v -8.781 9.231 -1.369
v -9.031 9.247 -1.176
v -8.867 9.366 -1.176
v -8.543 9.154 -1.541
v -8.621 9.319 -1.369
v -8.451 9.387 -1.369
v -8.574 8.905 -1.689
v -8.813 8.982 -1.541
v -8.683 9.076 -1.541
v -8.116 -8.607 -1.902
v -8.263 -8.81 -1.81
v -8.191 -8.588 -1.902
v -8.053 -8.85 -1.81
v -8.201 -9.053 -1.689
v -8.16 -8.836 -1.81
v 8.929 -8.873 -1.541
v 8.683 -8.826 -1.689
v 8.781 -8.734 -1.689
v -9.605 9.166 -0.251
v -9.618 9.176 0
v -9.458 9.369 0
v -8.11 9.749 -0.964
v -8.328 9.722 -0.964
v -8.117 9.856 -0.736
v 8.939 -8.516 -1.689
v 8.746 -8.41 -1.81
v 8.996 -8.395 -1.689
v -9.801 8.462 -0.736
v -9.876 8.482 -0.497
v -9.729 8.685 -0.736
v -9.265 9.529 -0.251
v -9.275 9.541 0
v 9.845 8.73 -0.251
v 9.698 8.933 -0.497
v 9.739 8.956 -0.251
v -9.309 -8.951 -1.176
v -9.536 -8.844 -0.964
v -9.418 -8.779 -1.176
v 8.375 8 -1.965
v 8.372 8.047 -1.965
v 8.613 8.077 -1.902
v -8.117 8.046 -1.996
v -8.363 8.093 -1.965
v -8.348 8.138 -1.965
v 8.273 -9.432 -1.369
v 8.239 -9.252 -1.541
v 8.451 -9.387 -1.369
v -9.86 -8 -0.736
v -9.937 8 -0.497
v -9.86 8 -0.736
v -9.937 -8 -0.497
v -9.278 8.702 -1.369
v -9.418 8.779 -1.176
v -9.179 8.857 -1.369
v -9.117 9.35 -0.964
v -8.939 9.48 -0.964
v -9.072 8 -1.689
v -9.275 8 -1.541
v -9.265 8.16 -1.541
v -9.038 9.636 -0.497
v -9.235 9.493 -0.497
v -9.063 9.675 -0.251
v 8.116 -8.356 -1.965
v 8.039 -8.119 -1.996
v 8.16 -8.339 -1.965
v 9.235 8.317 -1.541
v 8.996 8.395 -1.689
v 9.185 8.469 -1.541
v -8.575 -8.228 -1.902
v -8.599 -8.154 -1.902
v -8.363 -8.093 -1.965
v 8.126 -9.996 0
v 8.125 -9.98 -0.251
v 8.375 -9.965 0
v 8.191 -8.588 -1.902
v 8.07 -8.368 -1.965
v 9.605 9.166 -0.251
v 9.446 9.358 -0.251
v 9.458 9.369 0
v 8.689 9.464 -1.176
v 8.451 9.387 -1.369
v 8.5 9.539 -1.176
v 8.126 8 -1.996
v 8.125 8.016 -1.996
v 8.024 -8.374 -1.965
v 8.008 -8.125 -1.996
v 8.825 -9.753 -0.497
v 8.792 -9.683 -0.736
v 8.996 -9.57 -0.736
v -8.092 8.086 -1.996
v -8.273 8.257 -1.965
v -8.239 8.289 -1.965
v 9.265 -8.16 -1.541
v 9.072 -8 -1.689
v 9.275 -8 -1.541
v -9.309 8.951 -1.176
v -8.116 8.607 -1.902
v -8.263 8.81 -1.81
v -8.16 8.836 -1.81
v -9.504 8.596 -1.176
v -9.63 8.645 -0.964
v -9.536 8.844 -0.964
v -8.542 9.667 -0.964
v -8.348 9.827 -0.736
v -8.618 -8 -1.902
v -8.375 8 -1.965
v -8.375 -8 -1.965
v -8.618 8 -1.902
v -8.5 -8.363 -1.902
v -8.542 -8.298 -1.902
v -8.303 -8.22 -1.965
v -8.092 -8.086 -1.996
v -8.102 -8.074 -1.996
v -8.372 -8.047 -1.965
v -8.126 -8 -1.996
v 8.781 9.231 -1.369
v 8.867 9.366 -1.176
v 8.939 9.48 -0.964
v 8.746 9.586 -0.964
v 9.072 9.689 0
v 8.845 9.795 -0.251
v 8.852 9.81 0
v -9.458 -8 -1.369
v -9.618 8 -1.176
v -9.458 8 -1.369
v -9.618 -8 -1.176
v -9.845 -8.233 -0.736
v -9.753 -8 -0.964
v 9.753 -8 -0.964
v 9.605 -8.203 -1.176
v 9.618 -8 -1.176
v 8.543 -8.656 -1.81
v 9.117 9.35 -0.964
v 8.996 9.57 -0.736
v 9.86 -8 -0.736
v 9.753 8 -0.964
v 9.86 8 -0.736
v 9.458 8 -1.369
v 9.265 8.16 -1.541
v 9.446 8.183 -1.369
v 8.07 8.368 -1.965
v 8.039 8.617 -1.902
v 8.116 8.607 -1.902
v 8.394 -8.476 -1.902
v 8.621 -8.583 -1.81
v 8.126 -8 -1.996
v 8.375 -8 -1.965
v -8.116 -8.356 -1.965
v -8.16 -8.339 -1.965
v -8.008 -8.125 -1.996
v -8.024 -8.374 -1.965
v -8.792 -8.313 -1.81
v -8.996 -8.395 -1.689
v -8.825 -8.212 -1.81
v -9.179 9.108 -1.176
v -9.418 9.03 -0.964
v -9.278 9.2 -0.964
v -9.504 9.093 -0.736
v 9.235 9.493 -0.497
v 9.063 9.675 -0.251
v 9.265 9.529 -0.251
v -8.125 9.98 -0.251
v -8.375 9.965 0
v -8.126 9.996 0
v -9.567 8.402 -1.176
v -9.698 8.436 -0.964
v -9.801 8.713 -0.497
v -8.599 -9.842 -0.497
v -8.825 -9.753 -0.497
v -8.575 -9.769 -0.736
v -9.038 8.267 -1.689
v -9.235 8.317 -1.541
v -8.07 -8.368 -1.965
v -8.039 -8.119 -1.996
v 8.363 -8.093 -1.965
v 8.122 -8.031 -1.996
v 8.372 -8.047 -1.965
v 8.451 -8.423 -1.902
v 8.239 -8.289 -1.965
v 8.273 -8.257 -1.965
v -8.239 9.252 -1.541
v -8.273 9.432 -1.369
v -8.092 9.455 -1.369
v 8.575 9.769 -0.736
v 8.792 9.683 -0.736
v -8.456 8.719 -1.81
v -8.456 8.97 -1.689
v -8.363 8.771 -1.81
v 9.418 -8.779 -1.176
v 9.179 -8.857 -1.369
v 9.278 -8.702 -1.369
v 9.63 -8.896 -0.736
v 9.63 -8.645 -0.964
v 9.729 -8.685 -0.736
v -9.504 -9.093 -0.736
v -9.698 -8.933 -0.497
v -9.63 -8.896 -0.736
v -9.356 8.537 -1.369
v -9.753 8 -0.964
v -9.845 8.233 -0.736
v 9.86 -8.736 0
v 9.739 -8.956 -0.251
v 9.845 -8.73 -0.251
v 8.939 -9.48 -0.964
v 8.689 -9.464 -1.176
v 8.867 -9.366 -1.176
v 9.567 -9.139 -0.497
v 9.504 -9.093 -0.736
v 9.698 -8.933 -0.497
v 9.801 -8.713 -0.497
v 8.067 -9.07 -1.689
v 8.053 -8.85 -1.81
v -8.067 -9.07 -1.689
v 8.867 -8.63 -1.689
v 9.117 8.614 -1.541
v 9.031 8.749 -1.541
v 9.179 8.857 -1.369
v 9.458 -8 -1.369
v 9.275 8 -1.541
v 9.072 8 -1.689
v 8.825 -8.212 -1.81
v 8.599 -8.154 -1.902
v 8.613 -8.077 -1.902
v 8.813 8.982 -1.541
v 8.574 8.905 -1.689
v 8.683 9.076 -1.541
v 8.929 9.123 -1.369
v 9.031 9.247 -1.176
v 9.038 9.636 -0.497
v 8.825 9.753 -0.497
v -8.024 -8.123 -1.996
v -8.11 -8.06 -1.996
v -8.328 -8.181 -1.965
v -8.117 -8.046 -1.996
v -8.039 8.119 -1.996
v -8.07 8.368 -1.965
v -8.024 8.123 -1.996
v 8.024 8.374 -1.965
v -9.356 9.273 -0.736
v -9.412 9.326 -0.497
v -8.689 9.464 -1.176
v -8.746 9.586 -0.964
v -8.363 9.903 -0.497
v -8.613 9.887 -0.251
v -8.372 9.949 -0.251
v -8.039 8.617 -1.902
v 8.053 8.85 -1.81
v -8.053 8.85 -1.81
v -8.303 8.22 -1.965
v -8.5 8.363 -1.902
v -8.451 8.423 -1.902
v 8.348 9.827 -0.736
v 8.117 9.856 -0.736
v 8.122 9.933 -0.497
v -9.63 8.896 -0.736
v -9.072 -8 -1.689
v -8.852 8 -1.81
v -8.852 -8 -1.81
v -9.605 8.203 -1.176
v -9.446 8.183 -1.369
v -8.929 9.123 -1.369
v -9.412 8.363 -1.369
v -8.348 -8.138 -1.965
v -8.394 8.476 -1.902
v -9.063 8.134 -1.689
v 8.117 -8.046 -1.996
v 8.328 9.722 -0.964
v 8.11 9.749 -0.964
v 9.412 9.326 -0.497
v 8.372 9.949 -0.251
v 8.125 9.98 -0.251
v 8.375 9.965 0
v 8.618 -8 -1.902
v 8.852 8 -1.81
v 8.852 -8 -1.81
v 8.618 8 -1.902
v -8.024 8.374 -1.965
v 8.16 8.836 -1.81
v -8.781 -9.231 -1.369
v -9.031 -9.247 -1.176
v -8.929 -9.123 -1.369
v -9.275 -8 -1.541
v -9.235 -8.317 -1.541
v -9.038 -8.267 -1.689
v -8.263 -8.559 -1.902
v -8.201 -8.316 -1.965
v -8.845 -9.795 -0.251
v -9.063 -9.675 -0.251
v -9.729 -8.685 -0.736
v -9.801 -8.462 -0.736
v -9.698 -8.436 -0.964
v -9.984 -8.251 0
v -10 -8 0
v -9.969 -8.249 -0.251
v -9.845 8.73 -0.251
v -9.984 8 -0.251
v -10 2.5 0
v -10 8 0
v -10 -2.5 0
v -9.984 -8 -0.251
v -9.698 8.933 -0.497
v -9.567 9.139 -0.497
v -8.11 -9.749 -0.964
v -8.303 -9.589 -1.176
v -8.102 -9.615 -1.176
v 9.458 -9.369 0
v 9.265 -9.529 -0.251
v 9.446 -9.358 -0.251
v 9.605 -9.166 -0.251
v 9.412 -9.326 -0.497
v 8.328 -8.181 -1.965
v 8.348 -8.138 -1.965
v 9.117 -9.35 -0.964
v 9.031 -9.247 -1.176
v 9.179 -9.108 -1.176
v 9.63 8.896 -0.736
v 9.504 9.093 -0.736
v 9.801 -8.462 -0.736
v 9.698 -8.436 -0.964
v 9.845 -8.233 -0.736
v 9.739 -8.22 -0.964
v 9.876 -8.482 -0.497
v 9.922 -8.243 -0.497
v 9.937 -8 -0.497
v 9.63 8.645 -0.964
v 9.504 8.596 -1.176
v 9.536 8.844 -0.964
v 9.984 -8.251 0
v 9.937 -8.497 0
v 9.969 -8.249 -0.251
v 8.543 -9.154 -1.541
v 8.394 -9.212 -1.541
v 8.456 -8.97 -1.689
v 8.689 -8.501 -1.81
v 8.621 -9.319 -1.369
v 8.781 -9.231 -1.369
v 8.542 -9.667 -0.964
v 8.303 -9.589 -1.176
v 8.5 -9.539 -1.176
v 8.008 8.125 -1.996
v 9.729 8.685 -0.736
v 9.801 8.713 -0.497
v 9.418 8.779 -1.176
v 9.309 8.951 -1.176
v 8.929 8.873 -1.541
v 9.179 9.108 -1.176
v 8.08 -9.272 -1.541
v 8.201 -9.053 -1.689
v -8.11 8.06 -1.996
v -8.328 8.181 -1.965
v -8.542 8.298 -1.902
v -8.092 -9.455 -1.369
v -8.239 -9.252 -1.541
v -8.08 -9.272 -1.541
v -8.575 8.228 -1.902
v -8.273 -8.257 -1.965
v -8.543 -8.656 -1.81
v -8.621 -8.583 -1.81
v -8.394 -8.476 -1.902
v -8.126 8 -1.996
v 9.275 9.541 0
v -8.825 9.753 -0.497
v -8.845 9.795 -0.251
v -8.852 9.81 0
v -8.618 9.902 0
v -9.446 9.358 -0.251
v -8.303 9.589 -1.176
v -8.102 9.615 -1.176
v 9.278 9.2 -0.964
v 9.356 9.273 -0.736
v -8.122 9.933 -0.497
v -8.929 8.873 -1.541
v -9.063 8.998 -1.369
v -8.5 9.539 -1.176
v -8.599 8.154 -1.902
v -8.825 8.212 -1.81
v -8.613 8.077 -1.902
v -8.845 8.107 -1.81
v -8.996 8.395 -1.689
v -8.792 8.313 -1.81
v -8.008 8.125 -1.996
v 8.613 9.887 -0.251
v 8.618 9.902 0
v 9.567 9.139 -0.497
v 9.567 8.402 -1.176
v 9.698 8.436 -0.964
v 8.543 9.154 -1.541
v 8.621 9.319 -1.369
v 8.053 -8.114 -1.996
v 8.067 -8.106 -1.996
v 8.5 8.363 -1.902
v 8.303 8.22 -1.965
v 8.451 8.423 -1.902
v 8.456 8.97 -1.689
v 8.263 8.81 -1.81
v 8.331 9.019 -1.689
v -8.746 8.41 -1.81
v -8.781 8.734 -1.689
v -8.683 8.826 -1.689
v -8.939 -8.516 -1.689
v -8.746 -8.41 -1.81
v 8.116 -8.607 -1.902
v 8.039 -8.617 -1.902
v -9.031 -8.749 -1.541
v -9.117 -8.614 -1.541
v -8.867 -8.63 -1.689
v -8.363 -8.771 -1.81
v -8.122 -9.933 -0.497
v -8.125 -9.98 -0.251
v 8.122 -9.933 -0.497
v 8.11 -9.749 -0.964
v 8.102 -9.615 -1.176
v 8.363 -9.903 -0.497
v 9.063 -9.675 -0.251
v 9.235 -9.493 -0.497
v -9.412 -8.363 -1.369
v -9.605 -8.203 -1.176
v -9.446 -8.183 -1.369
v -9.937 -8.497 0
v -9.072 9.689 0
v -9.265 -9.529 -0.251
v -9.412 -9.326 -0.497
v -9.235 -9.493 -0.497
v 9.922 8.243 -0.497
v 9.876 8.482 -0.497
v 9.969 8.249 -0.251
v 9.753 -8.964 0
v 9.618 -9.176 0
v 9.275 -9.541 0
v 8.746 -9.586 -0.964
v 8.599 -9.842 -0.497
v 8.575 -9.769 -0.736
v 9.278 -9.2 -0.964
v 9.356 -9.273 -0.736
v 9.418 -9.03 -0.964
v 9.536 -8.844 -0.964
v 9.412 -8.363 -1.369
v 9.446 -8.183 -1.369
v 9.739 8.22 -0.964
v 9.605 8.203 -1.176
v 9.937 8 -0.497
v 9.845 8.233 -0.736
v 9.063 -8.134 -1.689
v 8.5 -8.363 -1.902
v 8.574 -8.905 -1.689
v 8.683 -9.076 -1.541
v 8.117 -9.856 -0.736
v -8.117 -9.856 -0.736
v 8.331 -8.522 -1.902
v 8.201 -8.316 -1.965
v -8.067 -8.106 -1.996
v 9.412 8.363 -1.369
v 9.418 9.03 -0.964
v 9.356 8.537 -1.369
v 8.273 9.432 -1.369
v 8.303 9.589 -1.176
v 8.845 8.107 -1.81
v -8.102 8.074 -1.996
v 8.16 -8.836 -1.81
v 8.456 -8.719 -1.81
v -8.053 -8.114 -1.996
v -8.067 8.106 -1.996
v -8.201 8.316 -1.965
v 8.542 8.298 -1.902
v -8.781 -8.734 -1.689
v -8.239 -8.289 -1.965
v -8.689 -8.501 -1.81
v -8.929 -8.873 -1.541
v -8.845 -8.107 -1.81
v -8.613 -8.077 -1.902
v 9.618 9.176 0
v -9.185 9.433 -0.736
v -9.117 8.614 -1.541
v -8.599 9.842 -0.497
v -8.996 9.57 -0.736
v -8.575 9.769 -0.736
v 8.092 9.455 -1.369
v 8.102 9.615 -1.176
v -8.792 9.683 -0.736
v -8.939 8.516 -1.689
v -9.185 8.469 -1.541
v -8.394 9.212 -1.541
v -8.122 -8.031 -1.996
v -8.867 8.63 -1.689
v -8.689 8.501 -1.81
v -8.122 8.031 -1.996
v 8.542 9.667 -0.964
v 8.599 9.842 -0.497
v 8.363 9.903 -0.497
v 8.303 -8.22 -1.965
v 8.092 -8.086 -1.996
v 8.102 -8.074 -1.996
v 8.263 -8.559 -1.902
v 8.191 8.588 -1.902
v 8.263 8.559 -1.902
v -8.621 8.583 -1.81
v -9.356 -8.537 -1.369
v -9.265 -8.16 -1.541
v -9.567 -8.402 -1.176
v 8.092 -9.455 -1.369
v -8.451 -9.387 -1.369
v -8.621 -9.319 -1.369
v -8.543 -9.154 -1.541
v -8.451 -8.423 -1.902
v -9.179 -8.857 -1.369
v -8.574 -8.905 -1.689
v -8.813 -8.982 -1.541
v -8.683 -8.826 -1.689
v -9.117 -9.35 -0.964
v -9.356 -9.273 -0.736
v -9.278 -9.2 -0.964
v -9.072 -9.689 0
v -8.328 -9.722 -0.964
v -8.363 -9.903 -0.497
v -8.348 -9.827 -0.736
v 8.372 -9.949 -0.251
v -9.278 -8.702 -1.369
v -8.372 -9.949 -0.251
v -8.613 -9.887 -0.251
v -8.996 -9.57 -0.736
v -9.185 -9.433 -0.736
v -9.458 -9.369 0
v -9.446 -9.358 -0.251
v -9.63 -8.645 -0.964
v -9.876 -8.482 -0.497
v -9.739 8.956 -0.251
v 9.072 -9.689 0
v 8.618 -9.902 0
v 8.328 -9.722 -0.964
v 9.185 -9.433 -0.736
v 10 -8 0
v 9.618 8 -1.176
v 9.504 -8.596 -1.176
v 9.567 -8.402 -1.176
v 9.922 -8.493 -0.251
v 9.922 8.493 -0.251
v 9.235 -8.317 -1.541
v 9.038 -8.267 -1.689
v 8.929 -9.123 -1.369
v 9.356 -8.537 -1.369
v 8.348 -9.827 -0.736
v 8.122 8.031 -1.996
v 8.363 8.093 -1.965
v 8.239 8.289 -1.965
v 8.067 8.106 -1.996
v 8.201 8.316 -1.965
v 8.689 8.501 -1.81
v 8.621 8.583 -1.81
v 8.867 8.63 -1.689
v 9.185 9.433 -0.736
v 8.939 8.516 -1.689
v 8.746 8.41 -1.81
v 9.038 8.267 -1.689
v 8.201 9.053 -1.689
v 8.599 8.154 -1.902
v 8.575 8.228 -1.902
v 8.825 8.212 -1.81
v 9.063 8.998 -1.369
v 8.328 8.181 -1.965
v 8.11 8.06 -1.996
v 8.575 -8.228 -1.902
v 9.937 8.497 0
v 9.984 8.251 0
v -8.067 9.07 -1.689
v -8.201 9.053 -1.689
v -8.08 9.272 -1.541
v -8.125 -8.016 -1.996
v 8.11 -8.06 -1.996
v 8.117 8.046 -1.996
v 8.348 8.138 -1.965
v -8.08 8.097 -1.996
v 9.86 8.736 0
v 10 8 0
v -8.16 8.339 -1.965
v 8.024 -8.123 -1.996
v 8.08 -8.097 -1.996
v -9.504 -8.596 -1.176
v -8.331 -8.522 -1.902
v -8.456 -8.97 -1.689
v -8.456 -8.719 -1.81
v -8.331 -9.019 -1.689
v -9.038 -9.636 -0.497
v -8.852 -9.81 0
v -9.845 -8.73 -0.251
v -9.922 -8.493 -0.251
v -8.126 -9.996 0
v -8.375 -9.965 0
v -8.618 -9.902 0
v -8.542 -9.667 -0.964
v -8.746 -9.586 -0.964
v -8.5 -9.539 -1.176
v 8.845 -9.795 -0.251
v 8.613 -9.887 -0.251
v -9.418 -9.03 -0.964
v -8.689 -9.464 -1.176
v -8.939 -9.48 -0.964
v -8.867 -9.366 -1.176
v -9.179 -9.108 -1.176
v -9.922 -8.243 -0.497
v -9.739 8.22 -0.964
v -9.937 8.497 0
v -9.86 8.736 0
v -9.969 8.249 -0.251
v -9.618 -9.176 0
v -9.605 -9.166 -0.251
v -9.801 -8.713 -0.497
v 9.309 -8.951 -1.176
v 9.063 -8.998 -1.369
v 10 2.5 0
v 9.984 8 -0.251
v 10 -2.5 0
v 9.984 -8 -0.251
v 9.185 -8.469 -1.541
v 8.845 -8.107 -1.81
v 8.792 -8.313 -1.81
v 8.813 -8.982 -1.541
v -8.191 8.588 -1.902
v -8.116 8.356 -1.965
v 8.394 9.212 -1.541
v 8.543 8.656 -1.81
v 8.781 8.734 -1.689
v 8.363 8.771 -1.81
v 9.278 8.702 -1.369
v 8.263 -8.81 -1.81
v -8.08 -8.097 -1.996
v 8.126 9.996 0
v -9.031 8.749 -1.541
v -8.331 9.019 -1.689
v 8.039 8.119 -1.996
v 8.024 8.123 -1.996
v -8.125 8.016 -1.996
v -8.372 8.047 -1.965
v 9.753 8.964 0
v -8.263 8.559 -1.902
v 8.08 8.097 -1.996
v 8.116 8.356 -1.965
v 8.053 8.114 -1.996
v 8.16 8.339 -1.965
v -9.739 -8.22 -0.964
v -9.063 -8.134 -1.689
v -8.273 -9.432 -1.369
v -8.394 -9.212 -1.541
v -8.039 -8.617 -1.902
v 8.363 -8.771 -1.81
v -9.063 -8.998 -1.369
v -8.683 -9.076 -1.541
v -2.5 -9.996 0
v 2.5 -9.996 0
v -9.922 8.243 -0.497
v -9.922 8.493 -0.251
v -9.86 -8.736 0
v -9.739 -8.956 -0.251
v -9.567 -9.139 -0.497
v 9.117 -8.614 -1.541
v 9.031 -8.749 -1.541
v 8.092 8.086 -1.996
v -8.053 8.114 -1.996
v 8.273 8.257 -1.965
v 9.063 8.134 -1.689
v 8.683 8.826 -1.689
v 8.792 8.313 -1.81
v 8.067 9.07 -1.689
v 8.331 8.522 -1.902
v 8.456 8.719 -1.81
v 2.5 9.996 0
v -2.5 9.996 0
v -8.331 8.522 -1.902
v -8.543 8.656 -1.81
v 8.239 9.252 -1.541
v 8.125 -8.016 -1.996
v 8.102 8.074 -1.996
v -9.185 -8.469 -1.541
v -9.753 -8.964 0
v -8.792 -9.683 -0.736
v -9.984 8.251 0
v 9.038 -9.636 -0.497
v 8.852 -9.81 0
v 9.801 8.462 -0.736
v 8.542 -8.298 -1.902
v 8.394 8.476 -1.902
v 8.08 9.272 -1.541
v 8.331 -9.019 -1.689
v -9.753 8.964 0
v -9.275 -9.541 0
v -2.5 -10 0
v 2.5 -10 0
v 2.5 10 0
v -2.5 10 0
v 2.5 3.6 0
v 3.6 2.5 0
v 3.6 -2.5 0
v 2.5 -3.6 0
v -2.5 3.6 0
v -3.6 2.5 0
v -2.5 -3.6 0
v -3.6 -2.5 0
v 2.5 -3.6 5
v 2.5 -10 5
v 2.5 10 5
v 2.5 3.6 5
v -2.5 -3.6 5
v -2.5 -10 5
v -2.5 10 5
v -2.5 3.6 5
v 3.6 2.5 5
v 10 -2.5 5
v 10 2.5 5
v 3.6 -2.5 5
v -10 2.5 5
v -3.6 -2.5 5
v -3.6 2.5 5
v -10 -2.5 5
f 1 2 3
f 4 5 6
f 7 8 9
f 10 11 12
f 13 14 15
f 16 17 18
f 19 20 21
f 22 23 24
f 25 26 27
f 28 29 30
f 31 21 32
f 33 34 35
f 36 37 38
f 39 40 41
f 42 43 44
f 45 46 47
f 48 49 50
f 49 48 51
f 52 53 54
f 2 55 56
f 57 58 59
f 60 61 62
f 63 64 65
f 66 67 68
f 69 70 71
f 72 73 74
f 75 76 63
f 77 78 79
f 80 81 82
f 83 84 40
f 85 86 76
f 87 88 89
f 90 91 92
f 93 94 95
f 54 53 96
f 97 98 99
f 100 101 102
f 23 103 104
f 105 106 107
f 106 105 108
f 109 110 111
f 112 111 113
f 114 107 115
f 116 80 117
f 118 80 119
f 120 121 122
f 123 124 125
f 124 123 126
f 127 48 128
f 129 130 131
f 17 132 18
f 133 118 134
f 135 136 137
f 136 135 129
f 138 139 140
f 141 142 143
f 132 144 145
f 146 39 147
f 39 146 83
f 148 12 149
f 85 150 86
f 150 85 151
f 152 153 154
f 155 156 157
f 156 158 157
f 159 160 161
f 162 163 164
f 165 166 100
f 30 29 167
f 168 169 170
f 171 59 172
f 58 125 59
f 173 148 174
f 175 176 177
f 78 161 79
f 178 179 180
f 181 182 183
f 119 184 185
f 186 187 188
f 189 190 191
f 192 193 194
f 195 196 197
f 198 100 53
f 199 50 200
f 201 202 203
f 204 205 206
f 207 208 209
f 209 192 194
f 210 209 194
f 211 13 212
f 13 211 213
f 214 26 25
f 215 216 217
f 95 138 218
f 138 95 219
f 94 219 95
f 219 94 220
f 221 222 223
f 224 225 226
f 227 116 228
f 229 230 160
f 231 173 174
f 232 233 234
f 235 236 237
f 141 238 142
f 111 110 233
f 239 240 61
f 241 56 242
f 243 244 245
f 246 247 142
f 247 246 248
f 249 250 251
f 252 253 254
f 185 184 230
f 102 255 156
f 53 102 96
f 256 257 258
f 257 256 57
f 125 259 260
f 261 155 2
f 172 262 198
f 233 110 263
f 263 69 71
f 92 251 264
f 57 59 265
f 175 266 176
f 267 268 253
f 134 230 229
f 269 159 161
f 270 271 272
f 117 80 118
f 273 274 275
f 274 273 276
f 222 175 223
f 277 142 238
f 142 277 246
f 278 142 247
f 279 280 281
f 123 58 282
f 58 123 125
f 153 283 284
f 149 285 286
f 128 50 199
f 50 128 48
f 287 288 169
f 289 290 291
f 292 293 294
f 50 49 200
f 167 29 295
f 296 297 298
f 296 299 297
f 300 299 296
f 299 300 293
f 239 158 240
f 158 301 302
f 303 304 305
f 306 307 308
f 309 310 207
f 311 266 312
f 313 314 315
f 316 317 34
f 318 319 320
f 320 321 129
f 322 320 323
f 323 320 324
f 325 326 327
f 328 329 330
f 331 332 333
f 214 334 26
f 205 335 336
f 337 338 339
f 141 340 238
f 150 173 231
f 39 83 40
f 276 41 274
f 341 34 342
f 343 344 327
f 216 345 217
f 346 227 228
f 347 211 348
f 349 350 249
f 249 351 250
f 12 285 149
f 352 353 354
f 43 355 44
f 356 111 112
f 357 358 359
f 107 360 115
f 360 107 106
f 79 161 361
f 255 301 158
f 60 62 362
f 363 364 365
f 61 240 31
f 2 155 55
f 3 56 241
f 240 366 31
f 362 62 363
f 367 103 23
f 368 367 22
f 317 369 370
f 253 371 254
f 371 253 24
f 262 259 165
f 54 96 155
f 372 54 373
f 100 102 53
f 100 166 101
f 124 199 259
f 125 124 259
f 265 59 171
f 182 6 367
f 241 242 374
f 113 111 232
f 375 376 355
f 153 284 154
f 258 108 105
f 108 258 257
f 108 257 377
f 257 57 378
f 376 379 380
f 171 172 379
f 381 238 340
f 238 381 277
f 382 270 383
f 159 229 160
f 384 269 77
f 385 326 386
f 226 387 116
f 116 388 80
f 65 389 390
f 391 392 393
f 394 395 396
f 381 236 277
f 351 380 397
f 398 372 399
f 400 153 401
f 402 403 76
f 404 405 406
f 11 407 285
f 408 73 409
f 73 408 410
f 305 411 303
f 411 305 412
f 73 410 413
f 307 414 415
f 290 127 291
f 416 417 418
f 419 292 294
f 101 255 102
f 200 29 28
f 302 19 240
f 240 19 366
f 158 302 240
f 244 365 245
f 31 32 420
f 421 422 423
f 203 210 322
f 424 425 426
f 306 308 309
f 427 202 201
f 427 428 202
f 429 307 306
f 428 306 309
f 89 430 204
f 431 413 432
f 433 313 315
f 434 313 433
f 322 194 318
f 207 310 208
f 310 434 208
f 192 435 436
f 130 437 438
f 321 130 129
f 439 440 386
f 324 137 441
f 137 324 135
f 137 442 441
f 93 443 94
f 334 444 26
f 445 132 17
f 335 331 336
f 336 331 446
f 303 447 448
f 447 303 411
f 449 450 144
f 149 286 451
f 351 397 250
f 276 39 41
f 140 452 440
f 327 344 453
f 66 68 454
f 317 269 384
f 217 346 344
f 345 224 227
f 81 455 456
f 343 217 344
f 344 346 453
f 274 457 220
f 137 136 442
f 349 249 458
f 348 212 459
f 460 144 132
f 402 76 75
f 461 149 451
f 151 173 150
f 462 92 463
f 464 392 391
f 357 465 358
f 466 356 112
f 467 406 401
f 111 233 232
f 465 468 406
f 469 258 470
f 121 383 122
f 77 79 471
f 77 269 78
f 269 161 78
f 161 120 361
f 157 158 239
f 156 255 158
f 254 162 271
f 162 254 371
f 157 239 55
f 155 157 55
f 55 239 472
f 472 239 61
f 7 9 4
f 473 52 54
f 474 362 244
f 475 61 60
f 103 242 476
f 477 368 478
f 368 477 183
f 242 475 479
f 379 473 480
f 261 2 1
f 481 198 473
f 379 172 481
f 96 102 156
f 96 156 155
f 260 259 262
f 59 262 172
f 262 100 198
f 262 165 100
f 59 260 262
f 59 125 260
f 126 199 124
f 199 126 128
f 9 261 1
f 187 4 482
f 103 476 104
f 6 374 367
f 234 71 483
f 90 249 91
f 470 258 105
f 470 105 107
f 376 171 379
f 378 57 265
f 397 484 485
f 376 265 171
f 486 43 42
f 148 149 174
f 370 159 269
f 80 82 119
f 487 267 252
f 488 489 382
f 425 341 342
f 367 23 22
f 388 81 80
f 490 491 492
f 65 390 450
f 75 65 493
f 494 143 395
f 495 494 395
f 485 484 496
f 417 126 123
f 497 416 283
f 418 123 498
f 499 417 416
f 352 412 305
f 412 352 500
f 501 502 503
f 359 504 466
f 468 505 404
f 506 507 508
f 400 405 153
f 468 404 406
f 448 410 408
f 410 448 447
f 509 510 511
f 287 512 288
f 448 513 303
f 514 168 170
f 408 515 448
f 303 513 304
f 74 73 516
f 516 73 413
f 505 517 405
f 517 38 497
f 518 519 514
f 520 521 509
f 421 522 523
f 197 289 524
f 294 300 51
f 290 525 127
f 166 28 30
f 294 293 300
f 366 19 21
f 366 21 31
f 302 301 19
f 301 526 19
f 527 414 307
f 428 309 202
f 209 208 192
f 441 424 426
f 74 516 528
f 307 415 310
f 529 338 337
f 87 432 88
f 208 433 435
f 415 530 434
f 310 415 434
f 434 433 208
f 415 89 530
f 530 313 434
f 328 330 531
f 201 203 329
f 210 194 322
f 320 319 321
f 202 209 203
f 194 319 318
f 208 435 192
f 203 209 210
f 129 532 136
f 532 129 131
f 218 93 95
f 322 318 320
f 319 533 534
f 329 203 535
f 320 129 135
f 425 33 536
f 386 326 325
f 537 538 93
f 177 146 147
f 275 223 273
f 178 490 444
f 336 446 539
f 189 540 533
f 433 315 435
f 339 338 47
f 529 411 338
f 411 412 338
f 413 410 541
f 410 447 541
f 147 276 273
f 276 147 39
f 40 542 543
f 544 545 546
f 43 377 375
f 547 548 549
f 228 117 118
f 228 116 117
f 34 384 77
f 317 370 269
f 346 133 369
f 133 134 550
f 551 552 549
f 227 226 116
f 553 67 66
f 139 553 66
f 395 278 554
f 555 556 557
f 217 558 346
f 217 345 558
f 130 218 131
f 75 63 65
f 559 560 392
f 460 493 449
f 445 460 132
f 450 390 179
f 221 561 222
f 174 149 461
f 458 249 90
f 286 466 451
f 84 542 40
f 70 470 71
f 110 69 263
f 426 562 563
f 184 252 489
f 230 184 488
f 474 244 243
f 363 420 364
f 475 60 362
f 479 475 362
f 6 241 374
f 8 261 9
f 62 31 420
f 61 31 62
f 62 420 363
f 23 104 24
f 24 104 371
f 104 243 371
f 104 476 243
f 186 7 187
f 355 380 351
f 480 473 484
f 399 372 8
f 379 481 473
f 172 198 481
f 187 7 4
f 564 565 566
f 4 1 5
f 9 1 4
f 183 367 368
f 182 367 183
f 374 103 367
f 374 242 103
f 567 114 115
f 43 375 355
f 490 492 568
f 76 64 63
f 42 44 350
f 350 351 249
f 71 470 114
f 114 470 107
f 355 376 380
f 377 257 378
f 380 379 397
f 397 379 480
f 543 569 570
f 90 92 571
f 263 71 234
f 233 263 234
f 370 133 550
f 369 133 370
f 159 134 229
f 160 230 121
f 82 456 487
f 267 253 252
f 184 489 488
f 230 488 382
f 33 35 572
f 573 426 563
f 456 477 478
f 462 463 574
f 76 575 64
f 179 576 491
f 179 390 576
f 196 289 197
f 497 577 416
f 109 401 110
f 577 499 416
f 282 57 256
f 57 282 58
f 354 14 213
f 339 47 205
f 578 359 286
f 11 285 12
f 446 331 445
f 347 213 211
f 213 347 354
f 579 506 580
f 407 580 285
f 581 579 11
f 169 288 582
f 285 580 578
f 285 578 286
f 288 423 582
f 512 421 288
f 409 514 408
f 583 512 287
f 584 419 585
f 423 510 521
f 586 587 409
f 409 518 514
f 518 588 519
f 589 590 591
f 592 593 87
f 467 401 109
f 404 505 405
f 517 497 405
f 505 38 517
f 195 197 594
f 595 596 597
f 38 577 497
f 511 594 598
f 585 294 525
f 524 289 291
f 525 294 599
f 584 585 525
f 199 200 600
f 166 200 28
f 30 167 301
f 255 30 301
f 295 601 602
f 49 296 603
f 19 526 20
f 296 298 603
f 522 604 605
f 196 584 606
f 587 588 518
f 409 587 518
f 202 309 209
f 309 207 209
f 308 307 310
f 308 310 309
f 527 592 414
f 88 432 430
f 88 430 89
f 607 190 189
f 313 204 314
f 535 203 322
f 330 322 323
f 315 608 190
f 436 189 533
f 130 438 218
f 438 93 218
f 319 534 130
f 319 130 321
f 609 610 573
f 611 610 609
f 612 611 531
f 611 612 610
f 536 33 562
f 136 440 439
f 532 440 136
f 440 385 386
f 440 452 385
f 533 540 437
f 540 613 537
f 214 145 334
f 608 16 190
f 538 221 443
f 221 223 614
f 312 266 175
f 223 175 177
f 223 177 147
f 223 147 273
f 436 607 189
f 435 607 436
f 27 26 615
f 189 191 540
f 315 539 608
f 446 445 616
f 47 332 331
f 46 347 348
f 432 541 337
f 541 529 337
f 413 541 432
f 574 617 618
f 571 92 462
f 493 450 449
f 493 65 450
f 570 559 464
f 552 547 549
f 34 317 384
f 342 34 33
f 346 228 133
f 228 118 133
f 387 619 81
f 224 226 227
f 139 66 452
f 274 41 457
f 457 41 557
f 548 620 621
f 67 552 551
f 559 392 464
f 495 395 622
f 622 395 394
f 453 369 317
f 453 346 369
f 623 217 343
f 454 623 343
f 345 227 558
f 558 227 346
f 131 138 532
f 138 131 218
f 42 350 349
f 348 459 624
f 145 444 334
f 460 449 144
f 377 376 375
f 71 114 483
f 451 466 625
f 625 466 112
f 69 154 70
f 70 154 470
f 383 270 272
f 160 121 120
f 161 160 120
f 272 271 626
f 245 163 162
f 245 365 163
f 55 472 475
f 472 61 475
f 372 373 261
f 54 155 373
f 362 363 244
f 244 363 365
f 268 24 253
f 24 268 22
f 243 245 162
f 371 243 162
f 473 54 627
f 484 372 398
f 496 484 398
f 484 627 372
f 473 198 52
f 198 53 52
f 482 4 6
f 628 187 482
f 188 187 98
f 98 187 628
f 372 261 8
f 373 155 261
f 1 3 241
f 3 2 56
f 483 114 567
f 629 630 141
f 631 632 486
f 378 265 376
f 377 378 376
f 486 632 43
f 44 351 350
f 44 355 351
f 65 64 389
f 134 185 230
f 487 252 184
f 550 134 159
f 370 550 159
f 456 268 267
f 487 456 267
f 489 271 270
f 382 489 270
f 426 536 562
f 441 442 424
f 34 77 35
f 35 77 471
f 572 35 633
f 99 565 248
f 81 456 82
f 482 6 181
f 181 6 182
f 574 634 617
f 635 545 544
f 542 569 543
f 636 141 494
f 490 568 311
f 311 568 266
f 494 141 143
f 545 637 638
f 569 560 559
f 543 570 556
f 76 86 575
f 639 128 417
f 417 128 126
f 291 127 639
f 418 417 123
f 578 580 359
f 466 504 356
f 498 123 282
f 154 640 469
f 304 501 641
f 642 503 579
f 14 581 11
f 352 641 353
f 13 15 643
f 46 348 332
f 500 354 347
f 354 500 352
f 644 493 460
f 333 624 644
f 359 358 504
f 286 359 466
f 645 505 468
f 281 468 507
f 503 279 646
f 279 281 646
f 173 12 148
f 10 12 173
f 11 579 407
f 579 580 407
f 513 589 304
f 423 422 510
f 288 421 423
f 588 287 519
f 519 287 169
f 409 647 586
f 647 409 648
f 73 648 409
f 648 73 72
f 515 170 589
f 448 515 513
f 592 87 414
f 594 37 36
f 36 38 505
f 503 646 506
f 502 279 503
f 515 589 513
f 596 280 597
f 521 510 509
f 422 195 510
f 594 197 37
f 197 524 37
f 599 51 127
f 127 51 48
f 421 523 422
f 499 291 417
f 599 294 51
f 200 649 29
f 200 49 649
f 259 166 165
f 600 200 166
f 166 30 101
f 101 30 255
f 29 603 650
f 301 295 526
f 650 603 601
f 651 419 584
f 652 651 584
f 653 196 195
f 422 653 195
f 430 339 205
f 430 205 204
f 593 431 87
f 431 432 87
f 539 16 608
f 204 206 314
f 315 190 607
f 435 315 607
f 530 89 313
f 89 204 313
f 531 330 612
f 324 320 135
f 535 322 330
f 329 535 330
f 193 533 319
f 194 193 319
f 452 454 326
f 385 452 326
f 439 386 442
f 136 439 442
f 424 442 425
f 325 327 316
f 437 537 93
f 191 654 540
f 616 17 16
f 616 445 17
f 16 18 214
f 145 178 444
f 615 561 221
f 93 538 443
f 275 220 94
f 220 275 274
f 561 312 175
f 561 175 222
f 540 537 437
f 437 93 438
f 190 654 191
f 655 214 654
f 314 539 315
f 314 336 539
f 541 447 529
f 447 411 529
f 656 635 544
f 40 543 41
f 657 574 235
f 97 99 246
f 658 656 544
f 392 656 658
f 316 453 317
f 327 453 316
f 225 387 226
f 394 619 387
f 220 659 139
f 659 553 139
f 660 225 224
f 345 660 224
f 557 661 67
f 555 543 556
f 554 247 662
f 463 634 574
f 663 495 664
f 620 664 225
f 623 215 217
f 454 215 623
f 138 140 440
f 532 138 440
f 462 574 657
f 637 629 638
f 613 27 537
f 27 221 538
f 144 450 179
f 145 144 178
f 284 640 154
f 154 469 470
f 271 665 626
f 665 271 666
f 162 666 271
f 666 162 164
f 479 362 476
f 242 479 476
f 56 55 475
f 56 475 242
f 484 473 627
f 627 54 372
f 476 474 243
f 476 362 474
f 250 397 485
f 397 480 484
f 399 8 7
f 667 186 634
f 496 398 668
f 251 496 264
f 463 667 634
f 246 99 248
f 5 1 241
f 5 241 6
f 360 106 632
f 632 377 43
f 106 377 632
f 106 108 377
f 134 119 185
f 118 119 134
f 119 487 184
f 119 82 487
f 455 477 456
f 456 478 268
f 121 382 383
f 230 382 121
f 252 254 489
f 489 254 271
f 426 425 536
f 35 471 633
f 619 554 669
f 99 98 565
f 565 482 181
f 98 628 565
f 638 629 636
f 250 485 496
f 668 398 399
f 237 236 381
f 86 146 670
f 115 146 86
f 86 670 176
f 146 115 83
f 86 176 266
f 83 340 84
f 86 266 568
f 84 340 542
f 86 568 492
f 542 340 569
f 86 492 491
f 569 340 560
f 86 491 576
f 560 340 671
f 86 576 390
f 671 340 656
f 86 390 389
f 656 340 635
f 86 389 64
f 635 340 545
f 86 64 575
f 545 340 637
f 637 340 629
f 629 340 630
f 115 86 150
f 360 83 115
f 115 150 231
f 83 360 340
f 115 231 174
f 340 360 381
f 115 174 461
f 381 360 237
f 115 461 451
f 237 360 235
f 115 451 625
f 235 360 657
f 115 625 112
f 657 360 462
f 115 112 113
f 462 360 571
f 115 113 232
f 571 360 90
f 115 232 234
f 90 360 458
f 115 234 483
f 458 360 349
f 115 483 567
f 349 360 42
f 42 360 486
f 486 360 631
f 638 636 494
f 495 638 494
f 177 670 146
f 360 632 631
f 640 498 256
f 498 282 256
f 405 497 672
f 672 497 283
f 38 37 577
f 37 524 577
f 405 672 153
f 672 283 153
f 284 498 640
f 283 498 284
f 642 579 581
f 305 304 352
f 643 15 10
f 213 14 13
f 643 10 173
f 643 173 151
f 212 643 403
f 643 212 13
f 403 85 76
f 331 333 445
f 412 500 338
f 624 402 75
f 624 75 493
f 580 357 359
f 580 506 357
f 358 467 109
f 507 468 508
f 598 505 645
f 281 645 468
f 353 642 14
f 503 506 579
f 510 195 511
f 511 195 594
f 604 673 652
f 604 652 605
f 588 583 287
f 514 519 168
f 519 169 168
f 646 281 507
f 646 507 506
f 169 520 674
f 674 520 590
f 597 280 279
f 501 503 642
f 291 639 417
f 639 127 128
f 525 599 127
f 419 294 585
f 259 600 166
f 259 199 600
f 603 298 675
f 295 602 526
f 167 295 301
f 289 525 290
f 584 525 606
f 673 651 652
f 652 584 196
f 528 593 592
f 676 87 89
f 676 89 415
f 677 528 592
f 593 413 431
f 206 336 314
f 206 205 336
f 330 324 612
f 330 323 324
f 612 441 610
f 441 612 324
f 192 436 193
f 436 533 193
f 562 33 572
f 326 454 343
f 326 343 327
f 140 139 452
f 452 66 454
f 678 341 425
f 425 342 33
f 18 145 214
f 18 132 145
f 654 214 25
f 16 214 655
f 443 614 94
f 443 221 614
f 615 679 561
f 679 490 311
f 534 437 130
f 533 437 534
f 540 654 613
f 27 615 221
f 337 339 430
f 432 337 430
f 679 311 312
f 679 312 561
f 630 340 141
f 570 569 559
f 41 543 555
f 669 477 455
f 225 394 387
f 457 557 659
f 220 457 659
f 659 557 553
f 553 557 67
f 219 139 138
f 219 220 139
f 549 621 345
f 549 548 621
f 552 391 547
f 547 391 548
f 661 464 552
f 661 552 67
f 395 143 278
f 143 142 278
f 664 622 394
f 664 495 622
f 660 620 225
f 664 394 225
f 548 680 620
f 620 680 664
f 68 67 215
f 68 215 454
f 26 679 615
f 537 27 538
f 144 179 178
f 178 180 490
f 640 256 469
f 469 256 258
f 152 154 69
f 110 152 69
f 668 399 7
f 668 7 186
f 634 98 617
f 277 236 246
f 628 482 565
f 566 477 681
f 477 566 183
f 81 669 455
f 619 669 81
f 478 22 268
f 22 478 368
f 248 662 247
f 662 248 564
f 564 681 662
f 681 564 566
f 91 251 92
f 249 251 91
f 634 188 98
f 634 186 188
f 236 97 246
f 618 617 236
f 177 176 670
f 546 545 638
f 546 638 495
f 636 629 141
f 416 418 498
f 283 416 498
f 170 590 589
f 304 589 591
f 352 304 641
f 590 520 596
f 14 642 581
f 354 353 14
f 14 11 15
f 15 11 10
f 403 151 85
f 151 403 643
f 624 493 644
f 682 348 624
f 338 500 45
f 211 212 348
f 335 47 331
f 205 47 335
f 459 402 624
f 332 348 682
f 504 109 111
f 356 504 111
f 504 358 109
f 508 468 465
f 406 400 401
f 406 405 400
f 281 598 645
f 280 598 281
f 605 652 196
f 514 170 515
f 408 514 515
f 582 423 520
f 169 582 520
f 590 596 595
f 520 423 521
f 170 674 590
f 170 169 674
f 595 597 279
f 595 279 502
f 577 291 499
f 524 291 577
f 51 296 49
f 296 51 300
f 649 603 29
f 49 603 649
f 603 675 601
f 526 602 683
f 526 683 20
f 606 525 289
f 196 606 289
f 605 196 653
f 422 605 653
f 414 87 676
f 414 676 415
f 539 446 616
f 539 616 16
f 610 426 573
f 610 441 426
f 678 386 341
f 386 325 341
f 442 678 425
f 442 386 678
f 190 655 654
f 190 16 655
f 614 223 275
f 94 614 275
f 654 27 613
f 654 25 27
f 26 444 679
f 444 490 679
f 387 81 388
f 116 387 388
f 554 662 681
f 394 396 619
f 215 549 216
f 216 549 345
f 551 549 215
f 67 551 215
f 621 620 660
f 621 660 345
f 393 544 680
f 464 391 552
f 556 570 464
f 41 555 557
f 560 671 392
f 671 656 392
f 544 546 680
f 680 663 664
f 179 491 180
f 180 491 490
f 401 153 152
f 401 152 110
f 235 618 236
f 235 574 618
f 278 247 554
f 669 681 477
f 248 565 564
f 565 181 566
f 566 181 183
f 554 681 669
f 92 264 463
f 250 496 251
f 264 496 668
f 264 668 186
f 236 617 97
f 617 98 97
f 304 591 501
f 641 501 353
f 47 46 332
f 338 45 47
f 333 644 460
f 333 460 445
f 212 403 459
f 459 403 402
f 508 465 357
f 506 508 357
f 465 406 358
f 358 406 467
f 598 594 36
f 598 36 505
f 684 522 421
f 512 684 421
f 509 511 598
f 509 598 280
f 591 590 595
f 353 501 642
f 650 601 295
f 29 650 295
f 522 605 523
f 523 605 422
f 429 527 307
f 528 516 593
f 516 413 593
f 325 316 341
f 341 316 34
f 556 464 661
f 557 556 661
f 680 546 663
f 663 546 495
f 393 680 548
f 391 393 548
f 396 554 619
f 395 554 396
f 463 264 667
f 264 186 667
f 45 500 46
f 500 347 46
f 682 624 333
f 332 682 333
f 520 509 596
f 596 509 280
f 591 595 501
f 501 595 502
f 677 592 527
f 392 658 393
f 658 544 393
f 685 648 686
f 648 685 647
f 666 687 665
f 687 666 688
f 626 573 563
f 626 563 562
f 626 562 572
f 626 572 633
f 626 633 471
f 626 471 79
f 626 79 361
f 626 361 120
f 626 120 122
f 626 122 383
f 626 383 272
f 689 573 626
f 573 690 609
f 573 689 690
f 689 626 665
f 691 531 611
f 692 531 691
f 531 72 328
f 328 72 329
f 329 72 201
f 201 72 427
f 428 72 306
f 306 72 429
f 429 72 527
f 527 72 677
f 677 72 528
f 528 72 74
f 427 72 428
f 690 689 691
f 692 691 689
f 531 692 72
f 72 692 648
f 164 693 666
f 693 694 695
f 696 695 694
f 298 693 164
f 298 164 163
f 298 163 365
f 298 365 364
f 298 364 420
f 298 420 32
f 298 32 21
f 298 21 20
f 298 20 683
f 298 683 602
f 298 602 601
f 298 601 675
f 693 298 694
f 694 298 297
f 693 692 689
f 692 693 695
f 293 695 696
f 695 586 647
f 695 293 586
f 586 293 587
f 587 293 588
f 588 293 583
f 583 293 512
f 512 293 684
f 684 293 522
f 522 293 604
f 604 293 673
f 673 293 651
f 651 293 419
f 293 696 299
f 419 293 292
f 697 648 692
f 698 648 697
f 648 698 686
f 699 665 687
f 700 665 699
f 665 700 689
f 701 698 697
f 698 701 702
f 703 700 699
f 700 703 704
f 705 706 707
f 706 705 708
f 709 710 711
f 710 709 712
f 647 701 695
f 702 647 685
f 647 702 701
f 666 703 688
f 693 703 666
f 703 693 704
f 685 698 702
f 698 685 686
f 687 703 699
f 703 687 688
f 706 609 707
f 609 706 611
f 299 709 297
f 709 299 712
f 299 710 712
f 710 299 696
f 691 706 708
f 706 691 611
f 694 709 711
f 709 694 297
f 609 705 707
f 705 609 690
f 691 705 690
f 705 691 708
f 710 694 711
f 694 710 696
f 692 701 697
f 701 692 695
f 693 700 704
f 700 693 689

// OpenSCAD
$fn=50;
h=5;
prof=20;
r=2;

rotate([180,0,0]){
	difference(){
		spheres(r=r);
		translate([0,0,-h]) outerCube(h=h);
	}

	translate([0,0,-h]) difference(){
		notches(h=h);
		innerCube(h=h+0.01);
	}
}

module outerCube(h=10){
	translate([0,0,h/2]) cube([prof,prof,h], true);
}

module innerCube(h=10){
	translate([0,0,h/2]) cube([7.2,7.2,h], true);
}

module notches(h=10){
	translate([0,0,h/2]) cube([5,prof,h], true);
	translate([0,0,h/2]) cube([prof,5,h], true);
}

module spheres(r=3){
	x=prof/2-r;
	hull(){
		translate([x,x,0]) sphere(r=r);
		translate([x,-x,0]) sphere(r=r);
		translate([-x,x,0]) sphere(r=r);
		translate([-x,-x,0]) sphere(r=r);
	}
}
